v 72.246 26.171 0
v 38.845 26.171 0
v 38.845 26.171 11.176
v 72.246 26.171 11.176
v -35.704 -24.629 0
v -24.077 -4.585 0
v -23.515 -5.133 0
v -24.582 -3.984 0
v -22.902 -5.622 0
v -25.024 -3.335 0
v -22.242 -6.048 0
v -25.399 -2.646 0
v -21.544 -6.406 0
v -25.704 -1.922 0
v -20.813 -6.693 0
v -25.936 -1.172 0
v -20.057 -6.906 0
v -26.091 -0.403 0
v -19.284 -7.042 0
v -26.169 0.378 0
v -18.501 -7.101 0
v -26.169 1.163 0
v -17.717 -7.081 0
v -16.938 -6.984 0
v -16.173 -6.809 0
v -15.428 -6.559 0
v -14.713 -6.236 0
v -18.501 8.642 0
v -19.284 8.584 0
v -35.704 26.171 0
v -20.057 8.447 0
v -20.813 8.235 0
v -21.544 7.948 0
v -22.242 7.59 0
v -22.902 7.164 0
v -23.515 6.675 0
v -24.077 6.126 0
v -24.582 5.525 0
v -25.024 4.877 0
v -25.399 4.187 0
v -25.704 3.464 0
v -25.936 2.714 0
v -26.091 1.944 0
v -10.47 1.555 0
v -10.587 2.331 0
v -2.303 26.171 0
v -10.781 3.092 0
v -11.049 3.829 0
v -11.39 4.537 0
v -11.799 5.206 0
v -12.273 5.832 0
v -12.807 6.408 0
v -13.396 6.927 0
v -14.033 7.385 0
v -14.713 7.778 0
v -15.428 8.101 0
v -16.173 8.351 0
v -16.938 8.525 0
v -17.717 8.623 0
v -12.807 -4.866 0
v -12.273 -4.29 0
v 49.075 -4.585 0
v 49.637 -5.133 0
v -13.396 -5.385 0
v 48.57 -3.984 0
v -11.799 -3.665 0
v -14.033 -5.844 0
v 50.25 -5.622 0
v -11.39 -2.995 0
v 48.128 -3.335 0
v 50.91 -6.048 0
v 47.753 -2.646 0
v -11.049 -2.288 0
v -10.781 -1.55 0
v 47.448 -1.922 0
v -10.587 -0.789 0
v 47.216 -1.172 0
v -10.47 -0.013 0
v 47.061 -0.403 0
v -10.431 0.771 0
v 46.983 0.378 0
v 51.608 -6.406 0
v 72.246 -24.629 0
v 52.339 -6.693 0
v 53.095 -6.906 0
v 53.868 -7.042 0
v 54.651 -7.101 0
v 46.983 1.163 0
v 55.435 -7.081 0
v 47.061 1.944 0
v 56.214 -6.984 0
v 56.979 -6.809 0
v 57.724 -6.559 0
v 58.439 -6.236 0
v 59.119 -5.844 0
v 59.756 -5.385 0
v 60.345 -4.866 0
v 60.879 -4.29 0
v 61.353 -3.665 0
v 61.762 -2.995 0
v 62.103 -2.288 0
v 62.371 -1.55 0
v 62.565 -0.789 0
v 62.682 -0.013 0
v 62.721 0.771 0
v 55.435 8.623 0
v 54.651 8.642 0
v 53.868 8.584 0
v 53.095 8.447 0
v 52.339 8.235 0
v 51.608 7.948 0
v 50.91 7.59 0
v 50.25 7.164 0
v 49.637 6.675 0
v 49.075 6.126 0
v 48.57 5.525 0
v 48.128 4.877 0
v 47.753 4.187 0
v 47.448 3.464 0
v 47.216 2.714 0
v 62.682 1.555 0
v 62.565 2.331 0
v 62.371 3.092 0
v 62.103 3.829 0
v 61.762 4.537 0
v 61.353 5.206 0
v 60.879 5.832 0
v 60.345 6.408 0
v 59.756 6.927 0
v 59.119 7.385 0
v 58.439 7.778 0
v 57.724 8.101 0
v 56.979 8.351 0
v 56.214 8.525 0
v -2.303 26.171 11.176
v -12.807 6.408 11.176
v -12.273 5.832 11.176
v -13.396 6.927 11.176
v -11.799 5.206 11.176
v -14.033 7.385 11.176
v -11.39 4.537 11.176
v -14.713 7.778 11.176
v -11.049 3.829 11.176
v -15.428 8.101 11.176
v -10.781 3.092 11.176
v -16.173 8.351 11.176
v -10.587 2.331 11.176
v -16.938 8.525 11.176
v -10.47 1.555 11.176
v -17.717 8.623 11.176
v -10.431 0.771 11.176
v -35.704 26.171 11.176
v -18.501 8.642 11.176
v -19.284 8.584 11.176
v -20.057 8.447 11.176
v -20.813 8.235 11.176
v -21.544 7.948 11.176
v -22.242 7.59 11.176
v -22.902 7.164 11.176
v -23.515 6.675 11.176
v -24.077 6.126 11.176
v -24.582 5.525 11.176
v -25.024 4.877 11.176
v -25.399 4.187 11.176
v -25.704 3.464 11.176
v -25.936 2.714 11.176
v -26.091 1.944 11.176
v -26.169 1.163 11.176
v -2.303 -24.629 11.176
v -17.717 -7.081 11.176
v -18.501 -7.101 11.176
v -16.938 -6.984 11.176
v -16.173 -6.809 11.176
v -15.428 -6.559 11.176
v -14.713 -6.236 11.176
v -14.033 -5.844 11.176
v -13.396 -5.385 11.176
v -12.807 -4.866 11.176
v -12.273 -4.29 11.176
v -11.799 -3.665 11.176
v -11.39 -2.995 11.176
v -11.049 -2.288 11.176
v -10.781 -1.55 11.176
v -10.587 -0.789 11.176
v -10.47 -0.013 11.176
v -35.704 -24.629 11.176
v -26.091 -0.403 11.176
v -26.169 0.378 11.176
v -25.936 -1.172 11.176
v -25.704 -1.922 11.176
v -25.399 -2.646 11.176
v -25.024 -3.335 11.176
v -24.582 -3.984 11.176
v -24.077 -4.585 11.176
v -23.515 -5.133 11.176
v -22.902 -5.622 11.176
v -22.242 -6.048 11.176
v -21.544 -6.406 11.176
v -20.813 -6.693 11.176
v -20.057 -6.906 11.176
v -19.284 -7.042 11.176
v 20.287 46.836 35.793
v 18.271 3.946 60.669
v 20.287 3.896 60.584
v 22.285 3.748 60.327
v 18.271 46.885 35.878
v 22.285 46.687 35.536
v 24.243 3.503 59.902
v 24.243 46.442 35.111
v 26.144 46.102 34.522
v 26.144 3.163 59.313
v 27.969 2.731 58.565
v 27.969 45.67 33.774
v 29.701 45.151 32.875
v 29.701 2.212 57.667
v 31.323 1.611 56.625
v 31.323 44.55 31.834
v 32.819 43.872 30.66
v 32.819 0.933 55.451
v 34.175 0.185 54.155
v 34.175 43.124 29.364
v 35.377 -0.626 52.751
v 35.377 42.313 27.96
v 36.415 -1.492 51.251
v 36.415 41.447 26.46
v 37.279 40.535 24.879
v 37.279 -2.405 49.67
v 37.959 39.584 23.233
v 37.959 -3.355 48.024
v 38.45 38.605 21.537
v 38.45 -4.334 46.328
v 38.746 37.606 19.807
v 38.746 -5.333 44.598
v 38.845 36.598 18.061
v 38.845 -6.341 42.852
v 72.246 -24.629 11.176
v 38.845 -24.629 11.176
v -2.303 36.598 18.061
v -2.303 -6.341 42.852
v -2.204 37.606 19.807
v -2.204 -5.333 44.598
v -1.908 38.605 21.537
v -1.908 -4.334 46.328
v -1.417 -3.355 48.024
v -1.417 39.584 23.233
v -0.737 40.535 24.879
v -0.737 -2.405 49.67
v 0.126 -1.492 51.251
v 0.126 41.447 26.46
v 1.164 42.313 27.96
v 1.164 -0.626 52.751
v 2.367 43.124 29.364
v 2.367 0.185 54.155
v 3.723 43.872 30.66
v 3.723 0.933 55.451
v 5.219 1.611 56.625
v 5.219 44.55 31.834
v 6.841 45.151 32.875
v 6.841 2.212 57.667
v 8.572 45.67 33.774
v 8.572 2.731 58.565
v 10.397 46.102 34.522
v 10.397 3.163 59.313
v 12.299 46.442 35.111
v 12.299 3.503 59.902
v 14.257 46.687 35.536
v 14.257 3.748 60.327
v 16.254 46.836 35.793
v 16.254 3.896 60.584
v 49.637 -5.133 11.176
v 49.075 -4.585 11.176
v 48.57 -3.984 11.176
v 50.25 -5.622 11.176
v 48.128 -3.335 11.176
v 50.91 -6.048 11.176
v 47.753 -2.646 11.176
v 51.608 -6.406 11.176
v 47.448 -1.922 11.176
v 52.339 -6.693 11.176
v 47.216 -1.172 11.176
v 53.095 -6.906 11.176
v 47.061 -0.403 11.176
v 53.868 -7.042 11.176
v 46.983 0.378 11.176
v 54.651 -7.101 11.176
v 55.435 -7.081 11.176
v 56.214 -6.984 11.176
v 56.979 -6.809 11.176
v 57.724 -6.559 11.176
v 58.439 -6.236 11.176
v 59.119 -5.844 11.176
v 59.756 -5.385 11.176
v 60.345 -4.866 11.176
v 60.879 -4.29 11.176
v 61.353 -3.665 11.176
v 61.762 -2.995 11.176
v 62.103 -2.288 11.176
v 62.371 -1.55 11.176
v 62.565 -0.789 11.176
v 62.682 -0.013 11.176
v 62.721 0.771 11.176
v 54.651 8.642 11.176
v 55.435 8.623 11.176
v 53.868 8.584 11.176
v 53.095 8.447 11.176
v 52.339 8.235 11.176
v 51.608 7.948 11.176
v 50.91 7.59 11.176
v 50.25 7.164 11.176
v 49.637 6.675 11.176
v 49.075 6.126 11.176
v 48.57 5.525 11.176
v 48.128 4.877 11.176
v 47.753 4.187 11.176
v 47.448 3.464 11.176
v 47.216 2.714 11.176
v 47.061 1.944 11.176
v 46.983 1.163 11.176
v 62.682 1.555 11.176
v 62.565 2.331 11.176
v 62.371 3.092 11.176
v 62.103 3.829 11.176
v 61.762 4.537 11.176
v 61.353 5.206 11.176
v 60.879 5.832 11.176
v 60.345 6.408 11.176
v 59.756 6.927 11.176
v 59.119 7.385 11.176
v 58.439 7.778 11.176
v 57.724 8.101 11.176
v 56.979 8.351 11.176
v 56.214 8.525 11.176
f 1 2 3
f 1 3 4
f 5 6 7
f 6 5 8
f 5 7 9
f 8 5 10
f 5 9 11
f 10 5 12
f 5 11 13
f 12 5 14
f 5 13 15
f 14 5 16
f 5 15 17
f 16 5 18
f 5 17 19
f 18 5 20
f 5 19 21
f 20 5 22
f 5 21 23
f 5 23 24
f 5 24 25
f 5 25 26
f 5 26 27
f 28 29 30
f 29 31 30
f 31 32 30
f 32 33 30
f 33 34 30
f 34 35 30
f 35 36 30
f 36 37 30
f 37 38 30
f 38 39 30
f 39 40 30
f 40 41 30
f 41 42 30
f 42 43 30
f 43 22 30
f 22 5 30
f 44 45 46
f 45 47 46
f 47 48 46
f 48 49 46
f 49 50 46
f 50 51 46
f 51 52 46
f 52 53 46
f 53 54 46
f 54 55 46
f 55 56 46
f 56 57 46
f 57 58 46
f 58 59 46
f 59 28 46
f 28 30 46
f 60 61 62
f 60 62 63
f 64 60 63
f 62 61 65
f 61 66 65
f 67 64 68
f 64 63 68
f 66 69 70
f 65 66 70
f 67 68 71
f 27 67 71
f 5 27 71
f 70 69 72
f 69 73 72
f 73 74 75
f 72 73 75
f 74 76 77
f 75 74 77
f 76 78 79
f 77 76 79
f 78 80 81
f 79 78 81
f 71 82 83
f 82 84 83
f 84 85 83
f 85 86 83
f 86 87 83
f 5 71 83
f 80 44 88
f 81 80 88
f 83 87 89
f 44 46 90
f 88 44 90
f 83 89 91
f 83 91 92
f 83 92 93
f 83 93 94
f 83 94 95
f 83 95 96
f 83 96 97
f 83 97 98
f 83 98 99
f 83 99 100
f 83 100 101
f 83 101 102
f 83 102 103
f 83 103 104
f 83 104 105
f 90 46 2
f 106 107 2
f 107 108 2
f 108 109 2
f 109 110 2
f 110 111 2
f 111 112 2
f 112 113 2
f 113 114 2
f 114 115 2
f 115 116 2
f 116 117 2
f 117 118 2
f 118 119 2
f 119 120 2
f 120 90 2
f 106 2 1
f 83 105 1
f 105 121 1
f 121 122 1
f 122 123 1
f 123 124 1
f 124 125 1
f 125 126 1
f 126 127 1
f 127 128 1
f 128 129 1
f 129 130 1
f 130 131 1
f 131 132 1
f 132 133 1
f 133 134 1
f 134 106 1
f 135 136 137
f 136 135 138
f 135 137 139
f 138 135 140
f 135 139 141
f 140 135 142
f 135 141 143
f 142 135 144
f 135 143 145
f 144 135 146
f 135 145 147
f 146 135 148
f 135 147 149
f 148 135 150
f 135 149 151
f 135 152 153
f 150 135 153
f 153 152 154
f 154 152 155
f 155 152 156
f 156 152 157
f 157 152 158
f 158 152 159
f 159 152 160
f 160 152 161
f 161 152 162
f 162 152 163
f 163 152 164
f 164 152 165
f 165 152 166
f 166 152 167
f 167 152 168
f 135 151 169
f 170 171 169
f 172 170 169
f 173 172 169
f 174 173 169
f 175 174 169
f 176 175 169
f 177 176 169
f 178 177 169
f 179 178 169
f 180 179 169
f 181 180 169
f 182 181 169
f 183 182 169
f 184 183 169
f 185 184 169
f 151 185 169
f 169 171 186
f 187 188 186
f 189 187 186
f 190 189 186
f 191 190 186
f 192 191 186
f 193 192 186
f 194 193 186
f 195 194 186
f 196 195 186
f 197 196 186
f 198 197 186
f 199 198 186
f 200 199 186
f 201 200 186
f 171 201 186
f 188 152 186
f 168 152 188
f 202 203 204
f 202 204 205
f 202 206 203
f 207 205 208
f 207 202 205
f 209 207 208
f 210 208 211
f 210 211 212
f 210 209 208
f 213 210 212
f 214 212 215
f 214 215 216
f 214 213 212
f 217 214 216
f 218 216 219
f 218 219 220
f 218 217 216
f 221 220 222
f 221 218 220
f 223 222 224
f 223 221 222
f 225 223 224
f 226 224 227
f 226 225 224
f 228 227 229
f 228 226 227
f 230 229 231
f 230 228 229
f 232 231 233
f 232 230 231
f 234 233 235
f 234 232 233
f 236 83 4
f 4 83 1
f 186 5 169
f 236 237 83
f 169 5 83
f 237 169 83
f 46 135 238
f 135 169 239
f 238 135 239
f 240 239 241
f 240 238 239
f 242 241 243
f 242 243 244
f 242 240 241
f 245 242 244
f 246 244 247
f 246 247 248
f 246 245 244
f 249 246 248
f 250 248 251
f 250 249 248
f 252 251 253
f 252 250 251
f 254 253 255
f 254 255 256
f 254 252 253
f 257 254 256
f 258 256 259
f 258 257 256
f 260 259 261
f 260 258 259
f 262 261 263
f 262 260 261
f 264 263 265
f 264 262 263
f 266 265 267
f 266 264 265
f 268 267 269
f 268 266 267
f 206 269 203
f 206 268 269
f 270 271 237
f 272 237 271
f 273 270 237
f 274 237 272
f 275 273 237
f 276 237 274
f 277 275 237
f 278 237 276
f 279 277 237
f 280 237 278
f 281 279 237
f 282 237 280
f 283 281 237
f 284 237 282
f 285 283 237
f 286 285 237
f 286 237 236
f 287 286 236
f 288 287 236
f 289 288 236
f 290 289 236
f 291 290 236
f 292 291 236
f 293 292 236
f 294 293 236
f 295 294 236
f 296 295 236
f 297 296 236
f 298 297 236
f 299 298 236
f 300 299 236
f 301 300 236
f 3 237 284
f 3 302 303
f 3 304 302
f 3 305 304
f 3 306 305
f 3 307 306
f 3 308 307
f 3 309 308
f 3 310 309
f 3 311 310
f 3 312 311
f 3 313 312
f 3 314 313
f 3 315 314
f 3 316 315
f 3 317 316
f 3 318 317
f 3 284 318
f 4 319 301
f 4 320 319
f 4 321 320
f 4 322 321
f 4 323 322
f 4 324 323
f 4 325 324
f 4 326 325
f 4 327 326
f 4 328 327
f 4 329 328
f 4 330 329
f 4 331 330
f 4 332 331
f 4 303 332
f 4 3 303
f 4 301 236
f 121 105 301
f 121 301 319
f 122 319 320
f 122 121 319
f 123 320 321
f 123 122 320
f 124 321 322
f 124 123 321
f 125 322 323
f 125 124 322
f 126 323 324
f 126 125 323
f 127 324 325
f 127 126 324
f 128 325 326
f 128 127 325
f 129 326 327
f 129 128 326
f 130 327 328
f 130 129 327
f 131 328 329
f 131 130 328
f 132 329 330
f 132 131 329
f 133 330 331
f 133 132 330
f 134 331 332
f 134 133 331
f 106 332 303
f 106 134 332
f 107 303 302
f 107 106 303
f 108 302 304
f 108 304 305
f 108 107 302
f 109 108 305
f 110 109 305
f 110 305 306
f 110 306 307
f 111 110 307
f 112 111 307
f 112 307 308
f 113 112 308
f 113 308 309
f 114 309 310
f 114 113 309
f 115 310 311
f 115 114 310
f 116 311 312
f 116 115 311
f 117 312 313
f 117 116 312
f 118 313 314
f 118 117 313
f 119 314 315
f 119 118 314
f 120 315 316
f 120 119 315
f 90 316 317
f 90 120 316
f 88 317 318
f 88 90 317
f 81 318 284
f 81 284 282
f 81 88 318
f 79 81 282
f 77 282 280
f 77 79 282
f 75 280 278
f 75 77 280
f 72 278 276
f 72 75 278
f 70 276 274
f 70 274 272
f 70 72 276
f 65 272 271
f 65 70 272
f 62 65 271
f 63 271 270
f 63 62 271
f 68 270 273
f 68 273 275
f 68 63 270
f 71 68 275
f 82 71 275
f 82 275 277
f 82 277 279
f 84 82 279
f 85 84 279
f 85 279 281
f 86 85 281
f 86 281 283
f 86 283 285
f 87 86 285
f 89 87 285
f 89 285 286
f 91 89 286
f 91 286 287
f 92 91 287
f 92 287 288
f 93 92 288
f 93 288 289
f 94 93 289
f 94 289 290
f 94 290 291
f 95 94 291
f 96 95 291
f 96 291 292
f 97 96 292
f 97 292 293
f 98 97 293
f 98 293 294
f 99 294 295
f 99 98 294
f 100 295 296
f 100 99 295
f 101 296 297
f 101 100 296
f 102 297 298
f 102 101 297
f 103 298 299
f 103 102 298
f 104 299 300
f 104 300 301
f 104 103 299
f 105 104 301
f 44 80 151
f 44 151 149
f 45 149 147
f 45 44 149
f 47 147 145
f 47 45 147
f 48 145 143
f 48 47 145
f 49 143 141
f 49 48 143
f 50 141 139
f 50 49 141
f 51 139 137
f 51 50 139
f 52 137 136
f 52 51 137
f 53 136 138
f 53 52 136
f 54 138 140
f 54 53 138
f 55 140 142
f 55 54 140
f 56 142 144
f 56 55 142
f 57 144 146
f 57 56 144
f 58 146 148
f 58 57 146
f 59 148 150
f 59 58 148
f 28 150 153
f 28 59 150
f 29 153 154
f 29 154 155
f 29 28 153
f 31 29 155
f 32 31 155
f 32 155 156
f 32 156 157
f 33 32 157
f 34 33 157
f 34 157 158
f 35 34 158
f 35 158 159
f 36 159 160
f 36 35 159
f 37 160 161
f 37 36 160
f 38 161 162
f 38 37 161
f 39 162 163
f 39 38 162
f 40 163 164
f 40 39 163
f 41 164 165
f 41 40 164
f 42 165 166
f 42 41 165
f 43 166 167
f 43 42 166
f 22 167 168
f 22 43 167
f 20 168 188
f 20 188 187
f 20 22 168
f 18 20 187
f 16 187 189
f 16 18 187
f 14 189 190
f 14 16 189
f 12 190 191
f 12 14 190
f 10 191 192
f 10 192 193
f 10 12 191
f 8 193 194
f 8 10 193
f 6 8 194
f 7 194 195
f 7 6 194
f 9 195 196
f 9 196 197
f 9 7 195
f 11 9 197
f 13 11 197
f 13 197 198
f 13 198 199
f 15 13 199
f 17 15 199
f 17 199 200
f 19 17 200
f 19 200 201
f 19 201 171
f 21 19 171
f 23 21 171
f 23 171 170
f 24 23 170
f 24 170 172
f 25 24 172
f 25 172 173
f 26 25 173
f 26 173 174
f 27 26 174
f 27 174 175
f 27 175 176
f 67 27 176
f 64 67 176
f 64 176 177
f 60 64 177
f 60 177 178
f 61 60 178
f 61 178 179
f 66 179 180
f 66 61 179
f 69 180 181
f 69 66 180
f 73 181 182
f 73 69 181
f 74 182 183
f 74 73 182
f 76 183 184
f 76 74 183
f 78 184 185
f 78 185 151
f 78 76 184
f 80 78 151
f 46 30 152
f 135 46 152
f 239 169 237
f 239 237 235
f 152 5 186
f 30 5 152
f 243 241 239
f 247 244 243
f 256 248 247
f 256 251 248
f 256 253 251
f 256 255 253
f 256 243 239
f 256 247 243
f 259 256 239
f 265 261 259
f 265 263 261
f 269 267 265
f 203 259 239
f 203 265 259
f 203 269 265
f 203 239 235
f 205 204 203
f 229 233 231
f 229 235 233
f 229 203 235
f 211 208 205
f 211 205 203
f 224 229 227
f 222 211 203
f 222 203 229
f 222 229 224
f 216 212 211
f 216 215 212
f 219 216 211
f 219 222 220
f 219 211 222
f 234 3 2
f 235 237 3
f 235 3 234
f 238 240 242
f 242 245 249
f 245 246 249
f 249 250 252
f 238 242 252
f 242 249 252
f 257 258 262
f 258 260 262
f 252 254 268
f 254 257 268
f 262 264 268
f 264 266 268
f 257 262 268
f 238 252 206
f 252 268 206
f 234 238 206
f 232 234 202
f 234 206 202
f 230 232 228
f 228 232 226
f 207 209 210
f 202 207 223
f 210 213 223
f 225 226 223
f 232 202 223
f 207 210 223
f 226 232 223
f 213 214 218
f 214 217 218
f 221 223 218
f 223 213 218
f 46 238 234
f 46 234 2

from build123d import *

# Parameters (mm, degrees)
F0_W     = 107.95
F0_H     = 50.8
F0_R     = 7.874
F1_DEPTH = 11.176
F3_DEPTH = 33.401
F4_DEPTH = 41.148
F5_DEPTH = 33.401
F6_W     = 41.148
F6_H     = 20.574
F7_DEPTH = 49.5820905122
F8_R     = 20.57399


# Not quite as in the source:
# - a fillet or chamfer is up to 0.001 mm smaller than in the source, because OpenCascade refuses the exact size


with BuildPart() as f1:
    # F0 (on Top) → F1 (new body)
    with BuildSketch(Plane.XY):
        with Locations((18.2708286419, 0.7708109915)):
            Rectangle(F0_W, F0_H)
        with Locations((-18.3051713581, 0.7708109915)):
            Circle(F0_R, mode=Mode.SUBTRACT)
        with Locations((54.8468286419, 0.7708109915)):
            Circle(F0_R, mode=Mode.SUBTRACT)
    extrude(amount=F1_DEPTH)



with BuildPart() as f3:
    # F2 (on face) → F3 (new body)
    with BuildSketch(Plane(origin=(-35.7041713581, 0, 0), x_dir=(0, -1, 0), z_dir=(-1, 0, 0))):
        Polygon((-26.1708109915, 11.176), (24.6291890085, 11.176), (6.3411890085, 42.8517451688), (-36.5981609479, 18.0606999127), (-26.1708109915, 0), align=None)
    extrude(amount=-F3_DEPTH)


with BuildPart() as f1_1:
    add(f1.part)
    # F4 (add): a face of the model
    f4_faces = [f3.part.faces().sort_by_distance(p)[0] for p in [
        (-2.3031713581, 4.9580328492, 21.6795412193),
    ]]

    add(f3.part)  # F4 merges F3
    extrude(f4_faces, amount=F4_DEPTH)

    # F2 (on face) → F5 (cut)
    with BuildSketch(Plane(origin=(-35.7041713581, 0, 0), x_dir=(0, -1, 0), z_dir=(-1, 0, 0))):
        Polygon((-26.1708109915, 11.176), (24.6291890085, 11.176), (6.3411890085, 42.8517451688), (-36.5981609479, 18.0606999127), (-26.1708109915, 0), align=None)
    extrude(amount=-F5_DEPTH, mode=Mode.SUBTRACT)

    # F6 (on face) → F7 (join, through all)
    with BuildSketch(Plane(origin=(0, -23.3112417127, 13.458751678), x_dir=(1, 0, 0), z_dir=(0, -0.8660254038, 0.5))):
        with Locations((18.2708286419, 44.2271054085)):
            Rectangle(F6_W, F6_H)
    extrude(amount=-F7_DEPTH)

    # F8 (radius 20.574 in the source; OpenCascade refuses exactly that, so slightly less here)
    f8_edges = [f1_1.edges().sort_by_distance(p)[0] for p in [
        (38.844829, 25.415486, 48.273829),
        (-2.303171, 25.415486, 48.273829),
    ]]
    fillet(f8_edges, radius=F8_R)


solid = f1_1.part
